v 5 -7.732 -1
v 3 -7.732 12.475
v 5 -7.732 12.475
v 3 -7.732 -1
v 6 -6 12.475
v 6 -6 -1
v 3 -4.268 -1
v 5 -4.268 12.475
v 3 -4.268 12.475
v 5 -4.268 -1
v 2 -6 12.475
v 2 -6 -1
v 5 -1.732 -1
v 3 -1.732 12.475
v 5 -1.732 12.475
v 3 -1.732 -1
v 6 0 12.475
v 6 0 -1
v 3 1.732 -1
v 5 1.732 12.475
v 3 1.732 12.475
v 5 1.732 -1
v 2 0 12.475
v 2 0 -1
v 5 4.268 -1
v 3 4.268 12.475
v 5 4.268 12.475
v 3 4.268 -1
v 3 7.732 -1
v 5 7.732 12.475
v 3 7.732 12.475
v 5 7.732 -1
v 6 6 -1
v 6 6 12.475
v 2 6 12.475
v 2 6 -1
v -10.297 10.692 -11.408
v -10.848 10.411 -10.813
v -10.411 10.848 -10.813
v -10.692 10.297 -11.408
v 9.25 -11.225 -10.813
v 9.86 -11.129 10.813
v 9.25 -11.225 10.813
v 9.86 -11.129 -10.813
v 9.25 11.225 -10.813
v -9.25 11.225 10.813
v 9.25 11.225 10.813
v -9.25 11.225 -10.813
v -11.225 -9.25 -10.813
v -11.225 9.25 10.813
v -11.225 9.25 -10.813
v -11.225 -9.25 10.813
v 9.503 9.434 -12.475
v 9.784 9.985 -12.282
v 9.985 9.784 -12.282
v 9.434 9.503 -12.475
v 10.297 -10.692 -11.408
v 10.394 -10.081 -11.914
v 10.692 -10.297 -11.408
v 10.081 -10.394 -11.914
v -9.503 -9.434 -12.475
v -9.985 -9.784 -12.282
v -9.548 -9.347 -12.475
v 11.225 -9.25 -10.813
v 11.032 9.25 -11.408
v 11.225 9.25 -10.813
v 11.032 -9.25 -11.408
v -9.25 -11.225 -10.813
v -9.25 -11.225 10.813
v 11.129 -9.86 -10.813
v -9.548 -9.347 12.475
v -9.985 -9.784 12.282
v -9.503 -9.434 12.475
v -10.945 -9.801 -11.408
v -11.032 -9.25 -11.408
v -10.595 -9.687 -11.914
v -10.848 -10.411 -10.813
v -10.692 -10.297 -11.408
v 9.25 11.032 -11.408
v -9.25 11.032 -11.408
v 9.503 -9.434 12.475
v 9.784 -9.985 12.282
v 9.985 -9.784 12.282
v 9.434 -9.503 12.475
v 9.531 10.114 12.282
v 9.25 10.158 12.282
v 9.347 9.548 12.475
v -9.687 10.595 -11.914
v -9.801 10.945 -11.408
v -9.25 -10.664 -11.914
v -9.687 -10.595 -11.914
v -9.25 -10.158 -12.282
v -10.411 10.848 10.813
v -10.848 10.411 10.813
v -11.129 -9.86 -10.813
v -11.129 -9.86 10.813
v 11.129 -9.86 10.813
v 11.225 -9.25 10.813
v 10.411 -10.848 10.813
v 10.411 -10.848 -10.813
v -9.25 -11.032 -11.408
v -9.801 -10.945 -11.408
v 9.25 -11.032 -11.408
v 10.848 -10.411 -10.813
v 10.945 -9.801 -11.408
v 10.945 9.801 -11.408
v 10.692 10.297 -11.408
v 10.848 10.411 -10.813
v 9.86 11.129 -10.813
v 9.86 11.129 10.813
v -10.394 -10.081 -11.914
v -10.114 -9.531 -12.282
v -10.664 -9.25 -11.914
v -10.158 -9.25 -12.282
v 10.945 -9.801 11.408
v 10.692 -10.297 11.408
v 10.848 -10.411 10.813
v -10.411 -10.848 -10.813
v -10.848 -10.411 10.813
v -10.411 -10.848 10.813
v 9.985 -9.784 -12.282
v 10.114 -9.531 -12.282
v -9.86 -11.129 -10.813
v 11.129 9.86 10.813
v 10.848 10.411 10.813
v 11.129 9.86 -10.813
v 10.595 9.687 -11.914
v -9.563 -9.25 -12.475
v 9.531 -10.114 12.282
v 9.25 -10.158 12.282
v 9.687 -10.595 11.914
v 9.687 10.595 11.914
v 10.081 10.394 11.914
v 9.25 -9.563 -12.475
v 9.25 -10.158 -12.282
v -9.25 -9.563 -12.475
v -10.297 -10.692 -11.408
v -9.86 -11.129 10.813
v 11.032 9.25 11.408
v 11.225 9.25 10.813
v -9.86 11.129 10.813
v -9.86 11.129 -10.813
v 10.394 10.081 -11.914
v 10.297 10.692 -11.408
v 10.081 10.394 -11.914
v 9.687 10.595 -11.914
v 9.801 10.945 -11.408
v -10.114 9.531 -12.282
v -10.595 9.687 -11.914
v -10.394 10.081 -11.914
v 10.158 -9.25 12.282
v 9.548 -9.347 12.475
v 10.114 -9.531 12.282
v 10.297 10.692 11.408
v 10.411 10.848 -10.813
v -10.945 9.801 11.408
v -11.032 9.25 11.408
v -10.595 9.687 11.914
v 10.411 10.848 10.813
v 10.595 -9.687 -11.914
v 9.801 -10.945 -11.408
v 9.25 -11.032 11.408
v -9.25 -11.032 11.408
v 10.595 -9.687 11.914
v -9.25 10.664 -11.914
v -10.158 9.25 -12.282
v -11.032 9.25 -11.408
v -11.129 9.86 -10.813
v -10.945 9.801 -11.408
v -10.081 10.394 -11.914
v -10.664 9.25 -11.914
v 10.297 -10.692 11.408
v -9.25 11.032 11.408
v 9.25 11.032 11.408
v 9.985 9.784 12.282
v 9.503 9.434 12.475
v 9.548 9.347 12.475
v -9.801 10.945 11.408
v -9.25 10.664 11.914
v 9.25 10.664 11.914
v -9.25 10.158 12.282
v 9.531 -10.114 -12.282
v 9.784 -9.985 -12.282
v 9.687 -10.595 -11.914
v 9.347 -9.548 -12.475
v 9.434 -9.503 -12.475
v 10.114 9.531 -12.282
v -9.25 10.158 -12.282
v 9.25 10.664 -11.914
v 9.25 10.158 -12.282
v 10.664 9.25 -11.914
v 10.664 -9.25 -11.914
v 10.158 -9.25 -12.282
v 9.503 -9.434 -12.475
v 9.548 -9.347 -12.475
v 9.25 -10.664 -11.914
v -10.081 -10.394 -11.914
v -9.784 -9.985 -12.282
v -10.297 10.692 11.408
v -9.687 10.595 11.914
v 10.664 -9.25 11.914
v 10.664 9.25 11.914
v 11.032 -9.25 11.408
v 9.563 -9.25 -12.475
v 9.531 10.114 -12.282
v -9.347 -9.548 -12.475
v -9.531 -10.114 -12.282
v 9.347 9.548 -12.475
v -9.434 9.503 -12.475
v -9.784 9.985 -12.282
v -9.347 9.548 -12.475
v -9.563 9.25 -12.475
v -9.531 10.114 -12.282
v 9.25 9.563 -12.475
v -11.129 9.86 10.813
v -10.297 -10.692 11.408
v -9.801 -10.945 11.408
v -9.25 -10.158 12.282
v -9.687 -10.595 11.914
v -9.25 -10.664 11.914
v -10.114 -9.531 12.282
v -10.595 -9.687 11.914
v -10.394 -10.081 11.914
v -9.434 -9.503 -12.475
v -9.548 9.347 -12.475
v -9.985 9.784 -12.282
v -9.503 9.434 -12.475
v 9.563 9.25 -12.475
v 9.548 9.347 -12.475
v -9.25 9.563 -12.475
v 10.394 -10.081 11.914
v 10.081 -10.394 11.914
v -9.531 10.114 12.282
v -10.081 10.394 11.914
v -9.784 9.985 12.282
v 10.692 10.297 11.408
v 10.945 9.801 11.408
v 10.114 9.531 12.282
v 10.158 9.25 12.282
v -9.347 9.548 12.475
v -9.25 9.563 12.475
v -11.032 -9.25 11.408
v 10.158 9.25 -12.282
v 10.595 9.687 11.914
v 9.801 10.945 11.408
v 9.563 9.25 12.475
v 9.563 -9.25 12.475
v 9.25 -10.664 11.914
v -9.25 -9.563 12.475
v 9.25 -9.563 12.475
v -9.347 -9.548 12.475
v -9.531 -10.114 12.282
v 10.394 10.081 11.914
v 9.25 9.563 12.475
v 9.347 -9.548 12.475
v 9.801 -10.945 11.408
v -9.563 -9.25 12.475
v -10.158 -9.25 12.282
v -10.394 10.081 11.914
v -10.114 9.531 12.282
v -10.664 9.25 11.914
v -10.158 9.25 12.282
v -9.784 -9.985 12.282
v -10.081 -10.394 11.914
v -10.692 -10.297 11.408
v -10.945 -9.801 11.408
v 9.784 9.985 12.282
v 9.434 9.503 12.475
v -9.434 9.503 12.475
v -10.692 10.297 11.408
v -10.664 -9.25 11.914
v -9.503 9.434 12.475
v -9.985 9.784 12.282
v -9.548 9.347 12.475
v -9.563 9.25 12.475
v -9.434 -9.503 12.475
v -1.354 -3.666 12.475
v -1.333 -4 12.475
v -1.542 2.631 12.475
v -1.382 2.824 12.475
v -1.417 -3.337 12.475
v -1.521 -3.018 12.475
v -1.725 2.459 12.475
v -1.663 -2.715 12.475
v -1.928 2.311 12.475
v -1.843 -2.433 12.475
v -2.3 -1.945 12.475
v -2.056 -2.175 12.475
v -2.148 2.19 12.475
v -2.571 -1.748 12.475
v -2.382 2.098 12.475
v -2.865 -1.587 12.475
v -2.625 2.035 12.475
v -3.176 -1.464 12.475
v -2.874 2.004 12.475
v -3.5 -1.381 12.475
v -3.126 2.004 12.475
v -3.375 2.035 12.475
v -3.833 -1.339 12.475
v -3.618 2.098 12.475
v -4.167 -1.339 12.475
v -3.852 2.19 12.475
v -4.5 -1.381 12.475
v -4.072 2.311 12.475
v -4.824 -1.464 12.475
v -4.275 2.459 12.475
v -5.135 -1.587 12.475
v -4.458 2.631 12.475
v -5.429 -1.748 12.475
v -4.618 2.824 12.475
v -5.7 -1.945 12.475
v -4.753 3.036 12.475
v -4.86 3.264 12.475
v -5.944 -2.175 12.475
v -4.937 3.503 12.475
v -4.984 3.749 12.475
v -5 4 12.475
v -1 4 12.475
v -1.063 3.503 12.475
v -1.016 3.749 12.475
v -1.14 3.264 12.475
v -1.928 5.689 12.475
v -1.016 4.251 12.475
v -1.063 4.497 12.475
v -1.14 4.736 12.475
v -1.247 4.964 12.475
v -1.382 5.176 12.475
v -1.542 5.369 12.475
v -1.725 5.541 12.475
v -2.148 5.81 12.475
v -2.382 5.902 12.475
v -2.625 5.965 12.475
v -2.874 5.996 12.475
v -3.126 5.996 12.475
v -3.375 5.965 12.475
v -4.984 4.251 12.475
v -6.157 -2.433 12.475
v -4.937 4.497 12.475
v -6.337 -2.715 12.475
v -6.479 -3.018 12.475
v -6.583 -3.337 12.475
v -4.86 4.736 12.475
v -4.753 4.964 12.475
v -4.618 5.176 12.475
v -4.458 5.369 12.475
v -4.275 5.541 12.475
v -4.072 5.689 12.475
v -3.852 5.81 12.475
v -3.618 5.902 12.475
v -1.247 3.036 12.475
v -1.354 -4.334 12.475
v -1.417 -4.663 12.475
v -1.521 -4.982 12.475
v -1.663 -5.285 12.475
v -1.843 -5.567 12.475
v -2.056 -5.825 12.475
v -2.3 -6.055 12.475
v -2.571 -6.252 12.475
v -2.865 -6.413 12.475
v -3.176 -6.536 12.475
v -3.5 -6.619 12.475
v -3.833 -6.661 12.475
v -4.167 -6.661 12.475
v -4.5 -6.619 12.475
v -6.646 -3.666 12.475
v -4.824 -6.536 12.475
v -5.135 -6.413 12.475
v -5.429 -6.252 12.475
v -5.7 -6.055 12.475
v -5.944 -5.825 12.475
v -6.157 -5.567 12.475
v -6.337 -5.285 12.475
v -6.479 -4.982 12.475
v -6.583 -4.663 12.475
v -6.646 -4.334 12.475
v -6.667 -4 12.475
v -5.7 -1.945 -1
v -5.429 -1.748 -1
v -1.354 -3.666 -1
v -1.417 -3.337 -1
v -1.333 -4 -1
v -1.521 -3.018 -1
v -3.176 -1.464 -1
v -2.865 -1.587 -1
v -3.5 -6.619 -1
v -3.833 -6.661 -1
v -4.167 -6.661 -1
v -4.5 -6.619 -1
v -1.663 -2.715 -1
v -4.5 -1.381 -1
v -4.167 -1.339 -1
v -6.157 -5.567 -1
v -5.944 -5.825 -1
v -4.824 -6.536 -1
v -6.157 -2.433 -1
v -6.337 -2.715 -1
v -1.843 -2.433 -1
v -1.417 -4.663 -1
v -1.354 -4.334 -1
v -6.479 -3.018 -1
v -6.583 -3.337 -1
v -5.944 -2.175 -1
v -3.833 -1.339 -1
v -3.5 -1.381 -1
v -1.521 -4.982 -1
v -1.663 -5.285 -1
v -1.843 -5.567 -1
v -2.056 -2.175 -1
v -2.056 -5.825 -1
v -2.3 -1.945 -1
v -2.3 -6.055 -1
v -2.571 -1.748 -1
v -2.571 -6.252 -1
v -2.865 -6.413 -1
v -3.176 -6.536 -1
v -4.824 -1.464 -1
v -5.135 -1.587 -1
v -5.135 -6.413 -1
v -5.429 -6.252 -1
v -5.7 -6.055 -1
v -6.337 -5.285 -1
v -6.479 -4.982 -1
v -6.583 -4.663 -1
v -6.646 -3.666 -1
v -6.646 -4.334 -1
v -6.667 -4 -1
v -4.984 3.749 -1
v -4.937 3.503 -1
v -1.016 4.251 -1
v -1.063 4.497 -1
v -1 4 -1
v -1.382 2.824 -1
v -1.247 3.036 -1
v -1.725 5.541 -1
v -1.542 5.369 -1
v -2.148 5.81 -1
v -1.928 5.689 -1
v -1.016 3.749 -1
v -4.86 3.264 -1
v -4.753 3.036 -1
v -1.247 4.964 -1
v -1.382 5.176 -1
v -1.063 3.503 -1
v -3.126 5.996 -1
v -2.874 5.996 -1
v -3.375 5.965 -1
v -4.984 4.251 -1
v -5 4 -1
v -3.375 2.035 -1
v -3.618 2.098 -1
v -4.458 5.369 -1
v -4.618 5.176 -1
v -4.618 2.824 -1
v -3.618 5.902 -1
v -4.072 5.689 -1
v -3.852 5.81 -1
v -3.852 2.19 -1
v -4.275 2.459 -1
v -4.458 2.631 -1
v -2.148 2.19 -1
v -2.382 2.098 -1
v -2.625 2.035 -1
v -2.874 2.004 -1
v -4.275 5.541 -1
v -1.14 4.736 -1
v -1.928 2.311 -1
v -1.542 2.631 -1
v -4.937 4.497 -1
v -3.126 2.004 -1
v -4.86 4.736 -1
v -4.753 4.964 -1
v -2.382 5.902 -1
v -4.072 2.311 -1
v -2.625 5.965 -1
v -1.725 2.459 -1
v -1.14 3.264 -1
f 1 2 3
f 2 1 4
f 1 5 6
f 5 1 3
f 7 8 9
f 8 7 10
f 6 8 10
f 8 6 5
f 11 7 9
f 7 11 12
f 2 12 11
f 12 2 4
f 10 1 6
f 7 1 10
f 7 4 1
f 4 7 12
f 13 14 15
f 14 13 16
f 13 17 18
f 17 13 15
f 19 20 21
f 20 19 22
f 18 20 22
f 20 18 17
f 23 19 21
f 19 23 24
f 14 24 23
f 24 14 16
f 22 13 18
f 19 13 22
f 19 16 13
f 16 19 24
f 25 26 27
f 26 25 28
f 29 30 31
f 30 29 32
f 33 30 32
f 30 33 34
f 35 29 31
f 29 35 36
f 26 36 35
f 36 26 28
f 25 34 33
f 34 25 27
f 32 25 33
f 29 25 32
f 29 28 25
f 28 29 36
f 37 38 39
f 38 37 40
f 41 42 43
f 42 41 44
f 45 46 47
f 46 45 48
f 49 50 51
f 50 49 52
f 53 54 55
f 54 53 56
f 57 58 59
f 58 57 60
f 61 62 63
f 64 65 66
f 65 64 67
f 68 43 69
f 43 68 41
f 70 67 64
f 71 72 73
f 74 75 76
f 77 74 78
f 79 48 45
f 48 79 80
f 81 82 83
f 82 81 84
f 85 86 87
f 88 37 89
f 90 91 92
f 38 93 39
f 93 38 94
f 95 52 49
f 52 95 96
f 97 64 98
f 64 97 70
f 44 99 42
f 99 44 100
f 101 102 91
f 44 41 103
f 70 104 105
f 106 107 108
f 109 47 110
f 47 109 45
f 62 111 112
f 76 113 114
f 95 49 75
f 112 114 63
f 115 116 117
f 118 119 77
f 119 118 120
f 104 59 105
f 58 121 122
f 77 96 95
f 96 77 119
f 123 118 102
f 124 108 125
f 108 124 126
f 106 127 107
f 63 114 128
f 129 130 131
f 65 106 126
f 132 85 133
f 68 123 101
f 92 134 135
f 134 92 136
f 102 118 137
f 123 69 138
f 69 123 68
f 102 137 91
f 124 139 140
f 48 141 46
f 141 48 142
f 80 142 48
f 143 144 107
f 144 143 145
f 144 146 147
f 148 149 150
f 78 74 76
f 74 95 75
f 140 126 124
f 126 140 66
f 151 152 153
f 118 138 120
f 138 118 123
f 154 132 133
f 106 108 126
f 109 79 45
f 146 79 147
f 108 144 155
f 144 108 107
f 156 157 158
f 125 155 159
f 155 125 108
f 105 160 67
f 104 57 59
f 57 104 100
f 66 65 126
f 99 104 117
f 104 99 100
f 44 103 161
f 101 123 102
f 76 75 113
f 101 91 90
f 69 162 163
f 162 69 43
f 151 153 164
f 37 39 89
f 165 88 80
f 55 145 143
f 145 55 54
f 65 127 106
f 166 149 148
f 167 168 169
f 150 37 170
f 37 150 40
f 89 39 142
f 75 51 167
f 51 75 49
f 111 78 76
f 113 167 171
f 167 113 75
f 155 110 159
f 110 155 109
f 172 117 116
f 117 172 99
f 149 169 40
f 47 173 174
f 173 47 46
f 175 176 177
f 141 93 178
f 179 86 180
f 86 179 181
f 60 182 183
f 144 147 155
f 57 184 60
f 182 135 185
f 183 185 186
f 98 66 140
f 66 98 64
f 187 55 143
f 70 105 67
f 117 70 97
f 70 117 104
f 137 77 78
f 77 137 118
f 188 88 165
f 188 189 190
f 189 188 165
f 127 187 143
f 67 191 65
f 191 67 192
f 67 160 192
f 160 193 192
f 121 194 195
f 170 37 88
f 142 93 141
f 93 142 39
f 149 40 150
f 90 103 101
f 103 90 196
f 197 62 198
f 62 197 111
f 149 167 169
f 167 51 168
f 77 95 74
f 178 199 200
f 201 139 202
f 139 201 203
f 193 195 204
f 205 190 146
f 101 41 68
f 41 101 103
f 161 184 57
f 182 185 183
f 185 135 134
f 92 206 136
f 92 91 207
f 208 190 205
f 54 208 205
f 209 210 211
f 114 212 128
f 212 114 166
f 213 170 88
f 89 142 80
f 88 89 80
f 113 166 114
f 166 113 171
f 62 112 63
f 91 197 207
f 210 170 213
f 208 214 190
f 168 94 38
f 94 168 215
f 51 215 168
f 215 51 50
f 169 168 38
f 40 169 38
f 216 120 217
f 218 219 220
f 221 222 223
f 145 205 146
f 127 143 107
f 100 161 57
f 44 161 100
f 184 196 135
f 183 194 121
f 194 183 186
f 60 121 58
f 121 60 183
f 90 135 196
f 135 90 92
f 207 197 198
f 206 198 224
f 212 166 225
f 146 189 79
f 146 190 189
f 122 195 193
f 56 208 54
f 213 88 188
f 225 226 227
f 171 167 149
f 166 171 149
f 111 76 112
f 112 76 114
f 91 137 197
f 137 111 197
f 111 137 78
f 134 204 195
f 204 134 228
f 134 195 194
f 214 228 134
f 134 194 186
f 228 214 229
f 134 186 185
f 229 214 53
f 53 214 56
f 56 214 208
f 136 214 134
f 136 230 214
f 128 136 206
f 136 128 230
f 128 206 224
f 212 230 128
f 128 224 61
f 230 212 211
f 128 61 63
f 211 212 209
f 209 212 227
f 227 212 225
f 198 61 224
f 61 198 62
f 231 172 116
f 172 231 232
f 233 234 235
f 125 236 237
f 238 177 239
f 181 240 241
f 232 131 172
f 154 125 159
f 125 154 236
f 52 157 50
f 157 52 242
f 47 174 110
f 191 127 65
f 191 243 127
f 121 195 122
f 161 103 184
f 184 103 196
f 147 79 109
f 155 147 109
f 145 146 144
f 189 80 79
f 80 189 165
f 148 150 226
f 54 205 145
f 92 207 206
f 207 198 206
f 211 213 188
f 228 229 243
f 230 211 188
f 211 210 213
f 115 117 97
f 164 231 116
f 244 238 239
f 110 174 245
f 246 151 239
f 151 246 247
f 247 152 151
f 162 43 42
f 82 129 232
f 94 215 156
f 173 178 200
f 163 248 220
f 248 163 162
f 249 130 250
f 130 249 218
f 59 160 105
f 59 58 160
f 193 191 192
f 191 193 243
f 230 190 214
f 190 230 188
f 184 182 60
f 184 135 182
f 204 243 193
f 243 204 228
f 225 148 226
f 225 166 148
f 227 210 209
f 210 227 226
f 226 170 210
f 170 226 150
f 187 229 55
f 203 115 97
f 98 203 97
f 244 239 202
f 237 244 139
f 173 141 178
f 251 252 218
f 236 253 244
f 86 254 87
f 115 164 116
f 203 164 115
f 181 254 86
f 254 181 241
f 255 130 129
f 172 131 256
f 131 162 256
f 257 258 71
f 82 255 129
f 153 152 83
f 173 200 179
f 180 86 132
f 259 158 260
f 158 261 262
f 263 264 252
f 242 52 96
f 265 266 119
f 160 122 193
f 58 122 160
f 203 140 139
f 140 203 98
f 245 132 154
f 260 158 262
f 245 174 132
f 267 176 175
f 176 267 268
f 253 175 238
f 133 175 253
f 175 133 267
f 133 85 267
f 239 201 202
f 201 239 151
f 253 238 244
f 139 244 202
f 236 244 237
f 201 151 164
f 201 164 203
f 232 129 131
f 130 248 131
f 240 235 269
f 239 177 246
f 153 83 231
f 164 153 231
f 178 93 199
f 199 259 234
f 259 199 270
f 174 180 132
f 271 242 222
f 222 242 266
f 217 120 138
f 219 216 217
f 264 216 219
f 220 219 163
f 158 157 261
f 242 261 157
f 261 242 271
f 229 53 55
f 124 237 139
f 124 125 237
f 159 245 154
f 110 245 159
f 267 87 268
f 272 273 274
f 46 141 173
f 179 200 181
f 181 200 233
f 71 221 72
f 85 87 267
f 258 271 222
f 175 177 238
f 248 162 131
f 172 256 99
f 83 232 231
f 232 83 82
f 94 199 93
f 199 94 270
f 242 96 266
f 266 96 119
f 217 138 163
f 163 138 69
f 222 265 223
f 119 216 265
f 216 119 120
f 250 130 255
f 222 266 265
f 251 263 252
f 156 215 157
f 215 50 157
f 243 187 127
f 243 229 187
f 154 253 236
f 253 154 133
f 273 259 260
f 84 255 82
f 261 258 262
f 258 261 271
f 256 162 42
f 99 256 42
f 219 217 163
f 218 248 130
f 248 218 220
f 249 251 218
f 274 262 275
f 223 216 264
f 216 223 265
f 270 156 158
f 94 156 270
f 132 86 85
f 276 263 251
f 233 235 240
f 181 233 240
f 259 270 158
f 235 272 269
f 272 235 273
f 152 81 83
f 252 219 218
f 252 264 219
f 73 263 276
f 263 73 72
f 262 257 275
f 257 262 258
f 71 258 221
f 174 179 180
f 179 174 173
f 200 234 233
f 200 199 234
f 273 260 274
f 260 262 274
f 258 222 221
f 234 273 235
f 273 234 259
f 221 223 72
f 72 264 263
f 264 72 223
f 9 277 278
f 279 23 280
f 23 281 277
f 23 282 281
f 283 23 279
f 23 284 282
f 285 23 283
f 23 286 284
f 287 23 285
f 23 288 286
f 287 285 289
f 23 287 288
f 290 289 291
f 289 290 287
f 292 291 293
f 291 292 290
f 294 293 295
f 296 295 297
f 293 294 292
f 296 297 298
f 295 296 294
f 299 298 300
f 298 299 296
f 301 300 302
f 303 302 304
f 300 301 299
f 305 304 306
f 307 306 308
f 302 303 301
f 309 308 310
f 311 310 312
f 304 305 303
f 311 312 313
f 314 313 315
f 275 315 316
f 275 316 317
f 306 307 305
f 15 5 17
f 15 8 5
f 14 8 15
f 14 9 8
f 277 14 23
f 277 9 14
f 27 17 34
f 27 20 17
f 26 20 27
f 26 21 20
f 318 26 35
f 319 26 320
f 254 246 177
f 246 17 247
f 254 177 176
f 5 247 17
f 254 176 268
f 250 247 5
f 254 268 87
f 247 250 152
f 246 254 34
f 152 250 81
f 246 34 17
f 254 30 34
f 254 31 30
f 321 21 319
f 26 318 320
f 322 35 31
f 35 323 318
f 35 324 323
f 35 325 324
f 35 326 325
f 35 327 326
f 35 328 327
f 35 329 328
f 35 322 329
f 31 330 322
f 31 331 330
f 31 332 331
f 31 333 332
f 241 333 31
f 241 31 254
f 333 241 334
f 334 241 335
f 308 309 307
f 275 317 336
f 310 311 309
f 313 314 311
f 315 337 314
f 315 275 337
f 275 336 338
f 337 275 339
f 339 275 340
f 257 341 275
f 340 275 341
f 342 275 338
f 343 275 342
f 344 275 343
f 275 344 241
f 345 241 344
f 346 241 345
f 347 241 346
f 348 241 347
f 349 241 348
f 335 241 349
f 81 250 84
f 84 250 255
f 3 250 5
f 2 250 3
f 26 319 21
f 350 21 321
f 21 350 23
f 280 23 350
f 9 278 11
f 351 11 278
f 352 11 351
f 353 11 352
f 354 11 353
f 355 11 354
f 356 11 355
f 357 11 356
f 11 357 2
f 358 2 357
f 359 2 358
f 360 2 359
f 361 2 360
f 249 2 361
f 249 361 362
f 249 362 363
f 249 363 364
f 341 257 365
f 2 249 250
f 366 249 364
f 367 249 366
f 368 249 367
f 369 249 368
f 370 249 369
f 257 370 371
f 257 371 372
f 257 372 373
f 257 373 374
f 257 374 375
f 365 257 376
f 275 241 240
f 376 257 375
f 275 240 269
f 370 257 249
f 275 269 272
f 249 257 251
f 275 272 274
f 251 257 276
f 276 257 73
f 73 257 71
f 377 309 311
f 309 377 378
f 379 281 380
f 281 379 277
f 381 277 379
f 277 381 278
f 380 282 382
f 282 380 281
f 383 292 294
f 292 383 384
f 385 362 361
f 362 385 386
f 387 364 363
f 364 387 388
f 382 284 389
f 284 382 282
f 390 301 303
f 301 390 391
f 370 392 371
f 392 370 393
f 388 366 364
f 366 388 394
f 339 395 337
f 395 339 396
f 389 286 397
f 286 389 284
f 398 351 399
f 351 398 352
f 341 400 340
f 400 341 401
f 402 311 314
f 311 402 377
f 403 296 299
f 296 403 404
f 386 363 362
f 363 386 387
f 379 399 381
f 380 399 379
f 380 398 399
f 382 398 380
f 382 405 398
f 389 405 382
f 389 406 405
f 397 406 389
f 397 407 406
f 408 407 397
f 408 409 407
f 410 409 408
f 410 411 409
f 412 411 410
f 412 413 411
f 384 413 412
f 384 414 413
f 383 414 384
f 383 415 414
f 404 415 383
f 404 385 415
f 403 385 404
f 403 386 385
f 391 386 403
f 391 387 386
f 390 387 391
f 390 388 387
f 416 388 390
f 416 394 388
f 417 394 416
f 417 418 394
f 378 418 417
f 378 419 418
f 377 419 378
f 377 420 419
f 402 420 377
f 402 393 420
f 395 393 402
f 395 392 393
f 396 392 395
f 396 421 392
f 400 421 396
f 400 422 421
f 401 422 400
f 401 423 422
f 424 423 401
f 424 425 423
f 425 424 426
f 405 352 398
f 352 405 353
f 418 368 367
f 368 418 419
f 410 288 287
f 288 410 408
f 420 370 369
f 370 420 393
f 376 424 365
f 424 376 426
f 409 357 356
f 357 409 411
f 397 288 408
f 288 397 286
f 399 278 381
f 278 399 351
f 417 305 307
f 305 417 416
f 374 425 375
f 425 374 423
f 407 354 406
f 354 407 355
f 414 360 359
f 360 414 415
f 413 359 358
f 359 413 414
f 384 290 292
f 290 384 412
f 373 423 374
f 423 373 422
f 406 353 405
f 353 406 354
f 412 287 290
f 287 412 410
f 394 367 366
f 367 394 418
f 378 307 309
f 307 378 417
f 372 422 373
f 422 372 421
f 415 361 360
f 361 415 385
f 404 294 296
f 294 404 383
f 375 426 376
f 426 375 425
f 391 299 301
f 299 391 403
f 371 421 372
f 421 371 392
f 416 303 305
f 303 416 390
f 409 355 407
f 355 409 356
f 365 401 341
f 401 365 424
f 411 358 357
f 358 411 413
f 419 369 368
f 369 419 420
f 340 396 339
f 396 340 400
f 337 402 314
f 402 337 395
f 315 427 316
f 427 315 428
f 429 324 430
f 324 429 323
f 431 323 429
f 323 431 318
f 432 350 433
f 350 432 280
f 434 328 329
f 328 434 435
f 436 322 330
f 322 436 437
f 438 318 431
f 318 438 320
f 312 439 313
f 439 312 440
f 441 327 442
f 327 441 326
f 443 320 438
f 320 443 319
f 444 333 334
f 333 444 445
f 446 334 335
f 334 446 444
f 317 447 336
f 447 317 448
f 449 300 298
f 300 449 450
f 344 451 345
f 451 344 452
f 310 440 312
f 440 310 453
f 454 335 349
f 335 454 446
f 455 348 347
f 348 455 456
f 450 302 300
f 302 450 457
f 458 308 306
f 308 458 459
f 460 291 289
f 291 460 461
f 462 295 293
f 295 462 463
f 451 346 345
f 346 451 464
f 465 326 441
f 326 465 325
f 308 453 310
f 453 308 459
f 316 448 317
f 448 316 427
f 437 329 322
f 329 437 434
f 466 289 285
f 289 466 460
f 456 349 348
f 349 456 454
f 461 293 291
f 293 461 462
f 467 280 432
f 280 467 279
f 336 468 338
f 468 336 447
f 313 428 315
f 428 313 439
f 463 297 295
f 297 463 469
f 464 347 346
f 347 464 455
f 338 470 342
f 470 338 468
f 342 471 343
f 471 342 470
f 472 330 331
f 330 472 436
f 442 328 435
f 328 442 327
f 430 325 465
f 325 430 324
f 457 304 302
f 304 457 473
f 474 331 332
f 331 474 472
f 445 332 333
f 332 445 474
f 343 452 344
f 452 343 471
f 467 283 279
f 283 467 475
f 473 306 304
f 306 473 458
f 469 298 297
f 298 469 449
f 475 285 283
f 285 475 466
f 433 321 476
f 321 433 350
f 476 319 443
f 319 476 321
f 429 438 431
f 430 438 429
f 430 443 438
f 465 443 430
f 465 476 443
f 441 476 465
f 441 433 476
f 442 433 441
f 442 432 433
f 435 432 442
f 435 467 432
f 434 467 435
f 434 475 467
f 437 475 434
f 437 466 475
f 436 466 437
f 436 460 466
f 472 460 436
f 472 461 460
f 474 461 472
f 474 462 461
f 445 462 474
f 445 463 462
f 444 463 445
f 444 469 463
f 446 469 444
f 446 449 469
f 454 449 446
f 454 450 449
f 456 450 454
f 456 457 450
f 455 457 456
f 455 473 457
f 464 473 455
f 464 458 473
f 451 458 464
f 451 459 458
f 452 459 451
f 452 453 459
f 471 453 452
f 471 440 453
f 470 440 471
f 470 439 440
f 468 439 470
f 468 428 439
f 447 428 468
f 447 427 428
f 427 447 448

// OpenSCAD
// 2.5 x 2.5 cm rectangle in OpenSCAD
// Note: OpenSCAD uses millimeters as default units
// 2.5 cm = 25 mm

// Parameters
hex_size = 4; // Adjust the size of hexagonal hole as needed
socket_diameter = 8; // 11mm diameter for socket hole
depth = 22;
bevel_radius = 2; // Radius for the beveled edges

// Main module
difference() {
    // Main cube with beveled edges using minkowski
    minkowski() {
        // Reduce cube size to account for the bevel expansion
        cube(size = [22.5-2*bevel_radius, 22.5-2*bevel_radius, 25-2*bevel_radius], center = true);
        // Sphere for creating the beveled edges
        sphere(r = bevel_radius, $fn = 20);
    }
    
    // Three hexagonal holes in a row
    for (i = [0:2]) {
        translate([4 , -6+ (i * 6), 10])
        cylinder(h = depth, d = hex_size, center = true, $fn = 6);
    }
    // Socket hole (extruded through the entire cube)
    translate([-4, -4, 10])
    cylinder(h = depth, d = socket_diameter/1.5, center = true, $fn = 50);
    // Socket hole (extruded through the entire cube)
    translate([-3, 4, 10])
    cylinder(h = depth, d = socket_diameter/2, center = true, $fn = 50);
}

// Create a 2.5x2.5 cm square (2D)
// square(size = 25, center = true);

// Alternatively, for a 3D rectangle with minimal height:
// cube(size = [25, 25, 25], center = true); 
